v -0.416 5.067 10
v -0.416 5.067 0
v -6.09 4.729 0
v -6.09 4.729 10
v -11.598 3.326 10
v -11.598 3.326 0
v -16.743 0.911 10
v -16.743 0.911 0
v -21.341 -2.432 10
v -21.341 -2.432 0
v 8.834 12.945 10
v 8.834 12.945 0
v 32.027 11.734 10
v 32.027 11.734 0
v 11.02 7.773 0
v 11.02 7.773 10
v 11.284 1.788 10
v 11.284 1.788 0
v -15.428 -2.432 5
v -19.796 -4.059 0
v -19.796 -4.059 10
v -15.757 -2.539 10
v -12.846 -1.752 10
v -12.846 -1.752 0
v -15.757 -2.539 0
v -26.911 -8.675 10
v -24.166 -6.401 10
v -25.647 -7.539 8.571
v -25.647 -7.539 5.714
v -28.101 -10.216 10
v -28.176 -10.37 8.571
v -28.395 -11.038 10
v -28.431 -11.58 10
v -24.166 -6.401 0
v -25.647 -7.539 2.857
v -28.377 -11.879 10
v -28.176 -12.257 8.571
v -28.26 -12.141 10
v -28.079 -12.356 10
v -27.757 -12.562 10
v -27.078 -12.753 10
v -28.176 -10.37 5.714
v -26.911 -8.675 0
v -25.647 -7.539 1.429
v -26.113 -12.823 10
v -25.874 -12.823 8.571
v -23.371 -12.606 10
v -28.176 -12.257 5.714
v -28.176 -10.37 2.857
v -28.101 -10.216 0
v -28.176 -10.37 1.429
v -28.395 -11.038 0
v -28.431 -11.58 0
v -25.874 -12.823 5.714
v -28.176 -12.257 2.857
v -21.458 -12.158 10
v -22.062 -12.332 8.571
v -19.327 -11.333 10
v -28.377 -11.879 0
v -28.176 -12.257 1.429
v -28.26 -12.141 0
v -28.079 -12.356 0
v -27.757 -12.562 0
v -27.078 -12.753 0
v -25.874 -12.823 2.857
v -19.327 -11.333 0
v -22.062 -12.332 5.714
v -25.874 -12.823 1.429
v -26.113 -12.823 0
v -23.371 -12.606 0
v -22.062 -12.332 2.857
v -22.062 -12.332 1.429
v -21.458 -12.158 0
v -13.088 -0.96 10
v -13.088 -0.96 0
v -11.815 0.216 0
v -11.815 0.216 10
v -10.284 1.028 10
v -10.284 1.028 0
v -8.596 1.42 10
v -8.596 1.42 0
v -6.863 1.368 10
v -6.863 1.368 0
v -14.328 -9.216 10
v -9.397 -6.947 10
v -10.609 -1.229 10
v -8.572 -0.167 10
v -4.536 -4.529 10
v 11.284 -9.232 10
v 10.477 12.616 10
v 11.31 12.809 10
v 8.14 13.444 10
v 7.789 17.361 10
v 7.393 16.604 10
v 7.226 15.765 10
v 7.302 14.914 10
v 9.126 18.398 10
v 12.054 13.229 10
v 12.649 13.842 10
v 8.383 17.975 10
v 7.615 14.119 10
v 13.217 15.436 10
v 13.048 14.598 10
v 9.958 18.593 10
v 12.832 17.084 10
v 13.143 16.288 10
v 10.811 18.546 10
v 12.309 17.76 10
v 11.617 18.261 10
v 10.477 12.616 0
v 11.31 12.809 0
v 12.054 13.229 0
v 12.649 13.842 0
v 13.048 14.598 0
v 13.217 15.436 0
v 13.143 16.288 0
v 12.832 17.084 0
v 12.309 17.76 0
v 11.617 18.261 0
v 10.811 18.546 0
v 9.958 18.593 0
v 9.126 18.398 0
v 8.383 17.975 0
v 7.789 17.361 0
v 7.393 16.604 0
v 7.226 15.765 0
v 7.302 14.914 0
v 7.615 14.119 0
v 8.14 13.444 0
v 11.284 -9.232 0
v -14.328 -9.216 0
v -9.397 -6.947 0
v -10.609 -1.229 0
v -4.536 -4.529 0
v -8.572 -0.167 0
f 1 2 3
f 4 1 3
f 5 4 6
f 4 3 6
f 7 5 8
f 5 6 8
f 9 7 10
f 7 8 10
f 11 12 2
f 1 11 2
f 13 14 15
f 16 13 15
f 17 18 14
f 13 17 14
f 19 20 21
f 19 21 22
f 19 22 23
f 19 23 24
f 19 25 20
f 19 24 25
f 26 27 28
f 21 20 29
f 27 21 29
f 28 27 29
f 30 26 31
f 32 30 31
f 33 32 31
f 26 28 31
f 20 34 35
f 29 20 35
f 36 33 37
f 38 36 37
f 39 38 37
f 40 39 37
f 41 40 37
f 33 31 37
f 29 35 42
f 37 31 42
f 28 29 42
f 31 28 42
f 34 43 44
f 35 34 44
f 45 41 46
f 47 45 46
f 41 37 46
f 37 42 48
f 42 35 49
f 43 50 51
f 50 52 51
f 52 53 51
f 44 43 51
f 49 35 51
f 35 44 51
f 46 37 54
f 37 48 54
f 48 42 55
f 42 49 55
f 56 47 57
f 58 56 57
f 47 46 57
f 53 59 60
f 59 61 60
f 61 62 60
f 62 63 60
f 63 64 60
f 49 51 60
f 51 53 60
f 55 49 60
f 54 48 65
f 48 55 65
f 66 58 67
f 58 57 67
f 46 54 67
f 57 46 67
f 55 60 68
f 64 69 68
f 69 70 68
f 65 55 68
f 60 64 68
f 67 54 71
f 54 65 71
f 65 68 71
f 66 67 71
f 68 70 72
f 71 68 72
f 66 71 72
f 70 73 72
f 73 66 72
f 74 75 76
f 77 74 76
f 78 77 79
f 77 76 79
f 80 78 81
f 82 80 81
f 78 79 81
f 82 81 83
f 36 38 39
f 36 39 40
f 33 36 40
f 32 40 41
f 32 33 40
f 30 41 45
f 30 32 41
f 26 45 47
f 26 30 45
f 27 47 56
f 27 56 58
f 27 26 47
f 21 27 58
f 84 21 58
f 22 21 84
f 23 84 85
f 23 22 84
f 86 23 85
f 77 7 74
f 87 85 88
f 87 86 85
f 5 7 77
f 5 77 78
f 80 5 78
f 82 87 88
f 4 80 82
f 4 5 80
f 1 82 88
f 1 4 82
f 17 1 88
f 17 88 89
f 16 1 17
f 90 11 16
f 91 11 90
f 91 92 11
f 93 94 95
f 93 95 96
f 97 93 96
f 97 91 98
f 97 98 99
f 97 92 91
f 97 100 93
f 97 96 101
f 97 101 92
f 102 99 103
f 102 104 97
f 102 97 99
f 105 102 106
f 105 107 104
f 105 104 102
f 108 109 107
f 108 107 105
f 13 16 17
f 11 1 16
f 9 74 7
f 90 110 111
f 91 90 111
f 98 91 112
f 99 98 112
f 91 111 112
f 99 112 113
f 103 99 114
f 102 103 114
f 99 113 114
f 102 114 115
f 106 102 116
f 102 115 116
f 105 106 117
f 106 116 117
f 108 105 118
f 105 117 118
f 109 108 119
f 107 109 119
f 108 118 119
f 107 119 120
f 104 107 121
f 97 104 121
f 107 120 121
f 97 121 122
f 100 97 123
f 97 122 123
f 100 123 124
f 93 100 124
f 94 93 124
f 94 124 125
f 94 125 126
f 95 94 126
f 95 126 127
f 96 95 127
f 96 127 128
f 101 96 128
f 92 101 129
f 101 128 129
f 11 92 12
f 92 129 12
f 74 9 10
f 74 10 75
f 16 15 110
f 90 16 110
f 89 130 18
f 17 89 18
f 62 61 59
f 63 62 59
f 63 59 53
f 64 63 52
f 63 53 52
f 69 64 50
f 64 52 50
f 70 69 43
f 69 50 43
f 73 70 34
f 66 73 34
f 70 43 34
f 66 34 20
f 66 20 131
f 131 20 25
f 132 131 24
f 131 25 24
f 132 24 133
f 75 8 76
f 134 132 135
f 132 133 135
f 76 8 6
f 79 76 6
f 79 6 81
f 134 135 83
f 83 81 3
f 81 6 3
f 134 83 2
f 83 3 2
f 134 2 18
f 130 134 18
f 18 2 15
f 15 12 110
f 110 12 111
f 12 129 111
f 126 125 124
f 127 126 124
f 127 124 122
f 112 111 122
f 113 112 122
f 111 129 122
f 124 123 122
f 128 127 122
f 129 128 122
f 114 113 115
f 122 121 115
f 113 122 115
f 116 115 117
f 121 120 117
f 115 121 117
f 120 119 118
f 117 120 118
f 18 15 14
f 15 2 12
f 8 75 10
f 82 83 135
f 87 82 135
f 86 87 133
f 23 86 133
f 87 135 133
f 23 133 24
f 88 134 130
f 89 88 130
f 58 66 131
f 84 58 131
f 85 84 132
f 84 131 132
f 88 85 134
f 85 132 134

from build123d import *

# Parameters (mm, degrees)
F1_DEPTH = 10


with BuildPart() as f1:
    # F0 (on Top) → F1 (new body)
    with BuildSketch(Plane.XY):
        with BuildLine():
            Line((8.8337385535, 12.9451678731), (-0.4161137905, 5.067145372))
            ThreePointArc((-0.4161137905, 5.067145372), (-11.5983099014, 3.326443887), (-21.3406799482, -2.4318351435))
            Line((-21.3406799482, -2.4318351435), (-13.0879584157, -0.9603441519))
            ThreePointArc((-13.0879584157, -0.9603441519), (-10.2837926867, 1.027964876), (-6.8630778746, 1.3677124313))
            ThreePointArc((-6.8630778746, 1.3677124313), (-9.5573222754, -0.7619129683), (-12.8457345774, -1.7521663529))
            add(Edge.make_bspline(
                [(-19.7956541441, -4.0594065459), (-18.2490652293, -3.4476707022), (-15.5318948257, -2.3729245214), (-13.6545231909, -1.9390733473), (-12.8457345774, -1.7521663529)],
                knots=[0, 0, 0, 0, 0.569190991, 1, 1, 1, 1], degree=3))
            add(Edge.make_bspline(
                [(-19.7956541441, -4.0594065459), (-20.8264896323, -4.5234313812), (-22.9036713574, -5.4584631287), (-25.6339482959, -7.4279370192), (-28.4569804187, -10.0420679848), (-28.5782861368, -12.6549207604), (-25.7048581352, -12.9493547061), (-22.02821781, -12.4866230869), (-20.1845868464, -11.699364312), (-19.3265960439, -11.3329890442)],
                knots=[0, 0, 0, 0, 0.1500372426, 0.3023320617, 0.4617024088, 0.5740753409, 0.7000305657, 0.8603999278, 1, 1, 1, 1], degree=3))
            ThreePointArc((-19.3265960439, -11.3329890442), (-11.8536932877, -8.1001795826), (-4.5364039775, -4.5290999462))
            Line((-4.5364039775, -4.5290999462), (11.284012926, -9.2315686646))
            Line((11.284012926, -9.2315686646), (11.284012926, 1.7881100454))
            Line((11.284012926, 1.7881100454), (32.0269530877, 11.7341596461))
            Line((32.0269530877, 11.7341596461), (11.0199585953, 7.7733433617))
            Line((11.0199585953, 7.7733433617), (10.4774531109, 12.6157083387))
            ThreePointArc((10.4774531109, 12.6157083387), (10.8112783366, 18.5462817312), (8.8337385535, 12.9451678731))
        make_face()
    extrude(amount=F1_DEPTH)


solid = f1.part
